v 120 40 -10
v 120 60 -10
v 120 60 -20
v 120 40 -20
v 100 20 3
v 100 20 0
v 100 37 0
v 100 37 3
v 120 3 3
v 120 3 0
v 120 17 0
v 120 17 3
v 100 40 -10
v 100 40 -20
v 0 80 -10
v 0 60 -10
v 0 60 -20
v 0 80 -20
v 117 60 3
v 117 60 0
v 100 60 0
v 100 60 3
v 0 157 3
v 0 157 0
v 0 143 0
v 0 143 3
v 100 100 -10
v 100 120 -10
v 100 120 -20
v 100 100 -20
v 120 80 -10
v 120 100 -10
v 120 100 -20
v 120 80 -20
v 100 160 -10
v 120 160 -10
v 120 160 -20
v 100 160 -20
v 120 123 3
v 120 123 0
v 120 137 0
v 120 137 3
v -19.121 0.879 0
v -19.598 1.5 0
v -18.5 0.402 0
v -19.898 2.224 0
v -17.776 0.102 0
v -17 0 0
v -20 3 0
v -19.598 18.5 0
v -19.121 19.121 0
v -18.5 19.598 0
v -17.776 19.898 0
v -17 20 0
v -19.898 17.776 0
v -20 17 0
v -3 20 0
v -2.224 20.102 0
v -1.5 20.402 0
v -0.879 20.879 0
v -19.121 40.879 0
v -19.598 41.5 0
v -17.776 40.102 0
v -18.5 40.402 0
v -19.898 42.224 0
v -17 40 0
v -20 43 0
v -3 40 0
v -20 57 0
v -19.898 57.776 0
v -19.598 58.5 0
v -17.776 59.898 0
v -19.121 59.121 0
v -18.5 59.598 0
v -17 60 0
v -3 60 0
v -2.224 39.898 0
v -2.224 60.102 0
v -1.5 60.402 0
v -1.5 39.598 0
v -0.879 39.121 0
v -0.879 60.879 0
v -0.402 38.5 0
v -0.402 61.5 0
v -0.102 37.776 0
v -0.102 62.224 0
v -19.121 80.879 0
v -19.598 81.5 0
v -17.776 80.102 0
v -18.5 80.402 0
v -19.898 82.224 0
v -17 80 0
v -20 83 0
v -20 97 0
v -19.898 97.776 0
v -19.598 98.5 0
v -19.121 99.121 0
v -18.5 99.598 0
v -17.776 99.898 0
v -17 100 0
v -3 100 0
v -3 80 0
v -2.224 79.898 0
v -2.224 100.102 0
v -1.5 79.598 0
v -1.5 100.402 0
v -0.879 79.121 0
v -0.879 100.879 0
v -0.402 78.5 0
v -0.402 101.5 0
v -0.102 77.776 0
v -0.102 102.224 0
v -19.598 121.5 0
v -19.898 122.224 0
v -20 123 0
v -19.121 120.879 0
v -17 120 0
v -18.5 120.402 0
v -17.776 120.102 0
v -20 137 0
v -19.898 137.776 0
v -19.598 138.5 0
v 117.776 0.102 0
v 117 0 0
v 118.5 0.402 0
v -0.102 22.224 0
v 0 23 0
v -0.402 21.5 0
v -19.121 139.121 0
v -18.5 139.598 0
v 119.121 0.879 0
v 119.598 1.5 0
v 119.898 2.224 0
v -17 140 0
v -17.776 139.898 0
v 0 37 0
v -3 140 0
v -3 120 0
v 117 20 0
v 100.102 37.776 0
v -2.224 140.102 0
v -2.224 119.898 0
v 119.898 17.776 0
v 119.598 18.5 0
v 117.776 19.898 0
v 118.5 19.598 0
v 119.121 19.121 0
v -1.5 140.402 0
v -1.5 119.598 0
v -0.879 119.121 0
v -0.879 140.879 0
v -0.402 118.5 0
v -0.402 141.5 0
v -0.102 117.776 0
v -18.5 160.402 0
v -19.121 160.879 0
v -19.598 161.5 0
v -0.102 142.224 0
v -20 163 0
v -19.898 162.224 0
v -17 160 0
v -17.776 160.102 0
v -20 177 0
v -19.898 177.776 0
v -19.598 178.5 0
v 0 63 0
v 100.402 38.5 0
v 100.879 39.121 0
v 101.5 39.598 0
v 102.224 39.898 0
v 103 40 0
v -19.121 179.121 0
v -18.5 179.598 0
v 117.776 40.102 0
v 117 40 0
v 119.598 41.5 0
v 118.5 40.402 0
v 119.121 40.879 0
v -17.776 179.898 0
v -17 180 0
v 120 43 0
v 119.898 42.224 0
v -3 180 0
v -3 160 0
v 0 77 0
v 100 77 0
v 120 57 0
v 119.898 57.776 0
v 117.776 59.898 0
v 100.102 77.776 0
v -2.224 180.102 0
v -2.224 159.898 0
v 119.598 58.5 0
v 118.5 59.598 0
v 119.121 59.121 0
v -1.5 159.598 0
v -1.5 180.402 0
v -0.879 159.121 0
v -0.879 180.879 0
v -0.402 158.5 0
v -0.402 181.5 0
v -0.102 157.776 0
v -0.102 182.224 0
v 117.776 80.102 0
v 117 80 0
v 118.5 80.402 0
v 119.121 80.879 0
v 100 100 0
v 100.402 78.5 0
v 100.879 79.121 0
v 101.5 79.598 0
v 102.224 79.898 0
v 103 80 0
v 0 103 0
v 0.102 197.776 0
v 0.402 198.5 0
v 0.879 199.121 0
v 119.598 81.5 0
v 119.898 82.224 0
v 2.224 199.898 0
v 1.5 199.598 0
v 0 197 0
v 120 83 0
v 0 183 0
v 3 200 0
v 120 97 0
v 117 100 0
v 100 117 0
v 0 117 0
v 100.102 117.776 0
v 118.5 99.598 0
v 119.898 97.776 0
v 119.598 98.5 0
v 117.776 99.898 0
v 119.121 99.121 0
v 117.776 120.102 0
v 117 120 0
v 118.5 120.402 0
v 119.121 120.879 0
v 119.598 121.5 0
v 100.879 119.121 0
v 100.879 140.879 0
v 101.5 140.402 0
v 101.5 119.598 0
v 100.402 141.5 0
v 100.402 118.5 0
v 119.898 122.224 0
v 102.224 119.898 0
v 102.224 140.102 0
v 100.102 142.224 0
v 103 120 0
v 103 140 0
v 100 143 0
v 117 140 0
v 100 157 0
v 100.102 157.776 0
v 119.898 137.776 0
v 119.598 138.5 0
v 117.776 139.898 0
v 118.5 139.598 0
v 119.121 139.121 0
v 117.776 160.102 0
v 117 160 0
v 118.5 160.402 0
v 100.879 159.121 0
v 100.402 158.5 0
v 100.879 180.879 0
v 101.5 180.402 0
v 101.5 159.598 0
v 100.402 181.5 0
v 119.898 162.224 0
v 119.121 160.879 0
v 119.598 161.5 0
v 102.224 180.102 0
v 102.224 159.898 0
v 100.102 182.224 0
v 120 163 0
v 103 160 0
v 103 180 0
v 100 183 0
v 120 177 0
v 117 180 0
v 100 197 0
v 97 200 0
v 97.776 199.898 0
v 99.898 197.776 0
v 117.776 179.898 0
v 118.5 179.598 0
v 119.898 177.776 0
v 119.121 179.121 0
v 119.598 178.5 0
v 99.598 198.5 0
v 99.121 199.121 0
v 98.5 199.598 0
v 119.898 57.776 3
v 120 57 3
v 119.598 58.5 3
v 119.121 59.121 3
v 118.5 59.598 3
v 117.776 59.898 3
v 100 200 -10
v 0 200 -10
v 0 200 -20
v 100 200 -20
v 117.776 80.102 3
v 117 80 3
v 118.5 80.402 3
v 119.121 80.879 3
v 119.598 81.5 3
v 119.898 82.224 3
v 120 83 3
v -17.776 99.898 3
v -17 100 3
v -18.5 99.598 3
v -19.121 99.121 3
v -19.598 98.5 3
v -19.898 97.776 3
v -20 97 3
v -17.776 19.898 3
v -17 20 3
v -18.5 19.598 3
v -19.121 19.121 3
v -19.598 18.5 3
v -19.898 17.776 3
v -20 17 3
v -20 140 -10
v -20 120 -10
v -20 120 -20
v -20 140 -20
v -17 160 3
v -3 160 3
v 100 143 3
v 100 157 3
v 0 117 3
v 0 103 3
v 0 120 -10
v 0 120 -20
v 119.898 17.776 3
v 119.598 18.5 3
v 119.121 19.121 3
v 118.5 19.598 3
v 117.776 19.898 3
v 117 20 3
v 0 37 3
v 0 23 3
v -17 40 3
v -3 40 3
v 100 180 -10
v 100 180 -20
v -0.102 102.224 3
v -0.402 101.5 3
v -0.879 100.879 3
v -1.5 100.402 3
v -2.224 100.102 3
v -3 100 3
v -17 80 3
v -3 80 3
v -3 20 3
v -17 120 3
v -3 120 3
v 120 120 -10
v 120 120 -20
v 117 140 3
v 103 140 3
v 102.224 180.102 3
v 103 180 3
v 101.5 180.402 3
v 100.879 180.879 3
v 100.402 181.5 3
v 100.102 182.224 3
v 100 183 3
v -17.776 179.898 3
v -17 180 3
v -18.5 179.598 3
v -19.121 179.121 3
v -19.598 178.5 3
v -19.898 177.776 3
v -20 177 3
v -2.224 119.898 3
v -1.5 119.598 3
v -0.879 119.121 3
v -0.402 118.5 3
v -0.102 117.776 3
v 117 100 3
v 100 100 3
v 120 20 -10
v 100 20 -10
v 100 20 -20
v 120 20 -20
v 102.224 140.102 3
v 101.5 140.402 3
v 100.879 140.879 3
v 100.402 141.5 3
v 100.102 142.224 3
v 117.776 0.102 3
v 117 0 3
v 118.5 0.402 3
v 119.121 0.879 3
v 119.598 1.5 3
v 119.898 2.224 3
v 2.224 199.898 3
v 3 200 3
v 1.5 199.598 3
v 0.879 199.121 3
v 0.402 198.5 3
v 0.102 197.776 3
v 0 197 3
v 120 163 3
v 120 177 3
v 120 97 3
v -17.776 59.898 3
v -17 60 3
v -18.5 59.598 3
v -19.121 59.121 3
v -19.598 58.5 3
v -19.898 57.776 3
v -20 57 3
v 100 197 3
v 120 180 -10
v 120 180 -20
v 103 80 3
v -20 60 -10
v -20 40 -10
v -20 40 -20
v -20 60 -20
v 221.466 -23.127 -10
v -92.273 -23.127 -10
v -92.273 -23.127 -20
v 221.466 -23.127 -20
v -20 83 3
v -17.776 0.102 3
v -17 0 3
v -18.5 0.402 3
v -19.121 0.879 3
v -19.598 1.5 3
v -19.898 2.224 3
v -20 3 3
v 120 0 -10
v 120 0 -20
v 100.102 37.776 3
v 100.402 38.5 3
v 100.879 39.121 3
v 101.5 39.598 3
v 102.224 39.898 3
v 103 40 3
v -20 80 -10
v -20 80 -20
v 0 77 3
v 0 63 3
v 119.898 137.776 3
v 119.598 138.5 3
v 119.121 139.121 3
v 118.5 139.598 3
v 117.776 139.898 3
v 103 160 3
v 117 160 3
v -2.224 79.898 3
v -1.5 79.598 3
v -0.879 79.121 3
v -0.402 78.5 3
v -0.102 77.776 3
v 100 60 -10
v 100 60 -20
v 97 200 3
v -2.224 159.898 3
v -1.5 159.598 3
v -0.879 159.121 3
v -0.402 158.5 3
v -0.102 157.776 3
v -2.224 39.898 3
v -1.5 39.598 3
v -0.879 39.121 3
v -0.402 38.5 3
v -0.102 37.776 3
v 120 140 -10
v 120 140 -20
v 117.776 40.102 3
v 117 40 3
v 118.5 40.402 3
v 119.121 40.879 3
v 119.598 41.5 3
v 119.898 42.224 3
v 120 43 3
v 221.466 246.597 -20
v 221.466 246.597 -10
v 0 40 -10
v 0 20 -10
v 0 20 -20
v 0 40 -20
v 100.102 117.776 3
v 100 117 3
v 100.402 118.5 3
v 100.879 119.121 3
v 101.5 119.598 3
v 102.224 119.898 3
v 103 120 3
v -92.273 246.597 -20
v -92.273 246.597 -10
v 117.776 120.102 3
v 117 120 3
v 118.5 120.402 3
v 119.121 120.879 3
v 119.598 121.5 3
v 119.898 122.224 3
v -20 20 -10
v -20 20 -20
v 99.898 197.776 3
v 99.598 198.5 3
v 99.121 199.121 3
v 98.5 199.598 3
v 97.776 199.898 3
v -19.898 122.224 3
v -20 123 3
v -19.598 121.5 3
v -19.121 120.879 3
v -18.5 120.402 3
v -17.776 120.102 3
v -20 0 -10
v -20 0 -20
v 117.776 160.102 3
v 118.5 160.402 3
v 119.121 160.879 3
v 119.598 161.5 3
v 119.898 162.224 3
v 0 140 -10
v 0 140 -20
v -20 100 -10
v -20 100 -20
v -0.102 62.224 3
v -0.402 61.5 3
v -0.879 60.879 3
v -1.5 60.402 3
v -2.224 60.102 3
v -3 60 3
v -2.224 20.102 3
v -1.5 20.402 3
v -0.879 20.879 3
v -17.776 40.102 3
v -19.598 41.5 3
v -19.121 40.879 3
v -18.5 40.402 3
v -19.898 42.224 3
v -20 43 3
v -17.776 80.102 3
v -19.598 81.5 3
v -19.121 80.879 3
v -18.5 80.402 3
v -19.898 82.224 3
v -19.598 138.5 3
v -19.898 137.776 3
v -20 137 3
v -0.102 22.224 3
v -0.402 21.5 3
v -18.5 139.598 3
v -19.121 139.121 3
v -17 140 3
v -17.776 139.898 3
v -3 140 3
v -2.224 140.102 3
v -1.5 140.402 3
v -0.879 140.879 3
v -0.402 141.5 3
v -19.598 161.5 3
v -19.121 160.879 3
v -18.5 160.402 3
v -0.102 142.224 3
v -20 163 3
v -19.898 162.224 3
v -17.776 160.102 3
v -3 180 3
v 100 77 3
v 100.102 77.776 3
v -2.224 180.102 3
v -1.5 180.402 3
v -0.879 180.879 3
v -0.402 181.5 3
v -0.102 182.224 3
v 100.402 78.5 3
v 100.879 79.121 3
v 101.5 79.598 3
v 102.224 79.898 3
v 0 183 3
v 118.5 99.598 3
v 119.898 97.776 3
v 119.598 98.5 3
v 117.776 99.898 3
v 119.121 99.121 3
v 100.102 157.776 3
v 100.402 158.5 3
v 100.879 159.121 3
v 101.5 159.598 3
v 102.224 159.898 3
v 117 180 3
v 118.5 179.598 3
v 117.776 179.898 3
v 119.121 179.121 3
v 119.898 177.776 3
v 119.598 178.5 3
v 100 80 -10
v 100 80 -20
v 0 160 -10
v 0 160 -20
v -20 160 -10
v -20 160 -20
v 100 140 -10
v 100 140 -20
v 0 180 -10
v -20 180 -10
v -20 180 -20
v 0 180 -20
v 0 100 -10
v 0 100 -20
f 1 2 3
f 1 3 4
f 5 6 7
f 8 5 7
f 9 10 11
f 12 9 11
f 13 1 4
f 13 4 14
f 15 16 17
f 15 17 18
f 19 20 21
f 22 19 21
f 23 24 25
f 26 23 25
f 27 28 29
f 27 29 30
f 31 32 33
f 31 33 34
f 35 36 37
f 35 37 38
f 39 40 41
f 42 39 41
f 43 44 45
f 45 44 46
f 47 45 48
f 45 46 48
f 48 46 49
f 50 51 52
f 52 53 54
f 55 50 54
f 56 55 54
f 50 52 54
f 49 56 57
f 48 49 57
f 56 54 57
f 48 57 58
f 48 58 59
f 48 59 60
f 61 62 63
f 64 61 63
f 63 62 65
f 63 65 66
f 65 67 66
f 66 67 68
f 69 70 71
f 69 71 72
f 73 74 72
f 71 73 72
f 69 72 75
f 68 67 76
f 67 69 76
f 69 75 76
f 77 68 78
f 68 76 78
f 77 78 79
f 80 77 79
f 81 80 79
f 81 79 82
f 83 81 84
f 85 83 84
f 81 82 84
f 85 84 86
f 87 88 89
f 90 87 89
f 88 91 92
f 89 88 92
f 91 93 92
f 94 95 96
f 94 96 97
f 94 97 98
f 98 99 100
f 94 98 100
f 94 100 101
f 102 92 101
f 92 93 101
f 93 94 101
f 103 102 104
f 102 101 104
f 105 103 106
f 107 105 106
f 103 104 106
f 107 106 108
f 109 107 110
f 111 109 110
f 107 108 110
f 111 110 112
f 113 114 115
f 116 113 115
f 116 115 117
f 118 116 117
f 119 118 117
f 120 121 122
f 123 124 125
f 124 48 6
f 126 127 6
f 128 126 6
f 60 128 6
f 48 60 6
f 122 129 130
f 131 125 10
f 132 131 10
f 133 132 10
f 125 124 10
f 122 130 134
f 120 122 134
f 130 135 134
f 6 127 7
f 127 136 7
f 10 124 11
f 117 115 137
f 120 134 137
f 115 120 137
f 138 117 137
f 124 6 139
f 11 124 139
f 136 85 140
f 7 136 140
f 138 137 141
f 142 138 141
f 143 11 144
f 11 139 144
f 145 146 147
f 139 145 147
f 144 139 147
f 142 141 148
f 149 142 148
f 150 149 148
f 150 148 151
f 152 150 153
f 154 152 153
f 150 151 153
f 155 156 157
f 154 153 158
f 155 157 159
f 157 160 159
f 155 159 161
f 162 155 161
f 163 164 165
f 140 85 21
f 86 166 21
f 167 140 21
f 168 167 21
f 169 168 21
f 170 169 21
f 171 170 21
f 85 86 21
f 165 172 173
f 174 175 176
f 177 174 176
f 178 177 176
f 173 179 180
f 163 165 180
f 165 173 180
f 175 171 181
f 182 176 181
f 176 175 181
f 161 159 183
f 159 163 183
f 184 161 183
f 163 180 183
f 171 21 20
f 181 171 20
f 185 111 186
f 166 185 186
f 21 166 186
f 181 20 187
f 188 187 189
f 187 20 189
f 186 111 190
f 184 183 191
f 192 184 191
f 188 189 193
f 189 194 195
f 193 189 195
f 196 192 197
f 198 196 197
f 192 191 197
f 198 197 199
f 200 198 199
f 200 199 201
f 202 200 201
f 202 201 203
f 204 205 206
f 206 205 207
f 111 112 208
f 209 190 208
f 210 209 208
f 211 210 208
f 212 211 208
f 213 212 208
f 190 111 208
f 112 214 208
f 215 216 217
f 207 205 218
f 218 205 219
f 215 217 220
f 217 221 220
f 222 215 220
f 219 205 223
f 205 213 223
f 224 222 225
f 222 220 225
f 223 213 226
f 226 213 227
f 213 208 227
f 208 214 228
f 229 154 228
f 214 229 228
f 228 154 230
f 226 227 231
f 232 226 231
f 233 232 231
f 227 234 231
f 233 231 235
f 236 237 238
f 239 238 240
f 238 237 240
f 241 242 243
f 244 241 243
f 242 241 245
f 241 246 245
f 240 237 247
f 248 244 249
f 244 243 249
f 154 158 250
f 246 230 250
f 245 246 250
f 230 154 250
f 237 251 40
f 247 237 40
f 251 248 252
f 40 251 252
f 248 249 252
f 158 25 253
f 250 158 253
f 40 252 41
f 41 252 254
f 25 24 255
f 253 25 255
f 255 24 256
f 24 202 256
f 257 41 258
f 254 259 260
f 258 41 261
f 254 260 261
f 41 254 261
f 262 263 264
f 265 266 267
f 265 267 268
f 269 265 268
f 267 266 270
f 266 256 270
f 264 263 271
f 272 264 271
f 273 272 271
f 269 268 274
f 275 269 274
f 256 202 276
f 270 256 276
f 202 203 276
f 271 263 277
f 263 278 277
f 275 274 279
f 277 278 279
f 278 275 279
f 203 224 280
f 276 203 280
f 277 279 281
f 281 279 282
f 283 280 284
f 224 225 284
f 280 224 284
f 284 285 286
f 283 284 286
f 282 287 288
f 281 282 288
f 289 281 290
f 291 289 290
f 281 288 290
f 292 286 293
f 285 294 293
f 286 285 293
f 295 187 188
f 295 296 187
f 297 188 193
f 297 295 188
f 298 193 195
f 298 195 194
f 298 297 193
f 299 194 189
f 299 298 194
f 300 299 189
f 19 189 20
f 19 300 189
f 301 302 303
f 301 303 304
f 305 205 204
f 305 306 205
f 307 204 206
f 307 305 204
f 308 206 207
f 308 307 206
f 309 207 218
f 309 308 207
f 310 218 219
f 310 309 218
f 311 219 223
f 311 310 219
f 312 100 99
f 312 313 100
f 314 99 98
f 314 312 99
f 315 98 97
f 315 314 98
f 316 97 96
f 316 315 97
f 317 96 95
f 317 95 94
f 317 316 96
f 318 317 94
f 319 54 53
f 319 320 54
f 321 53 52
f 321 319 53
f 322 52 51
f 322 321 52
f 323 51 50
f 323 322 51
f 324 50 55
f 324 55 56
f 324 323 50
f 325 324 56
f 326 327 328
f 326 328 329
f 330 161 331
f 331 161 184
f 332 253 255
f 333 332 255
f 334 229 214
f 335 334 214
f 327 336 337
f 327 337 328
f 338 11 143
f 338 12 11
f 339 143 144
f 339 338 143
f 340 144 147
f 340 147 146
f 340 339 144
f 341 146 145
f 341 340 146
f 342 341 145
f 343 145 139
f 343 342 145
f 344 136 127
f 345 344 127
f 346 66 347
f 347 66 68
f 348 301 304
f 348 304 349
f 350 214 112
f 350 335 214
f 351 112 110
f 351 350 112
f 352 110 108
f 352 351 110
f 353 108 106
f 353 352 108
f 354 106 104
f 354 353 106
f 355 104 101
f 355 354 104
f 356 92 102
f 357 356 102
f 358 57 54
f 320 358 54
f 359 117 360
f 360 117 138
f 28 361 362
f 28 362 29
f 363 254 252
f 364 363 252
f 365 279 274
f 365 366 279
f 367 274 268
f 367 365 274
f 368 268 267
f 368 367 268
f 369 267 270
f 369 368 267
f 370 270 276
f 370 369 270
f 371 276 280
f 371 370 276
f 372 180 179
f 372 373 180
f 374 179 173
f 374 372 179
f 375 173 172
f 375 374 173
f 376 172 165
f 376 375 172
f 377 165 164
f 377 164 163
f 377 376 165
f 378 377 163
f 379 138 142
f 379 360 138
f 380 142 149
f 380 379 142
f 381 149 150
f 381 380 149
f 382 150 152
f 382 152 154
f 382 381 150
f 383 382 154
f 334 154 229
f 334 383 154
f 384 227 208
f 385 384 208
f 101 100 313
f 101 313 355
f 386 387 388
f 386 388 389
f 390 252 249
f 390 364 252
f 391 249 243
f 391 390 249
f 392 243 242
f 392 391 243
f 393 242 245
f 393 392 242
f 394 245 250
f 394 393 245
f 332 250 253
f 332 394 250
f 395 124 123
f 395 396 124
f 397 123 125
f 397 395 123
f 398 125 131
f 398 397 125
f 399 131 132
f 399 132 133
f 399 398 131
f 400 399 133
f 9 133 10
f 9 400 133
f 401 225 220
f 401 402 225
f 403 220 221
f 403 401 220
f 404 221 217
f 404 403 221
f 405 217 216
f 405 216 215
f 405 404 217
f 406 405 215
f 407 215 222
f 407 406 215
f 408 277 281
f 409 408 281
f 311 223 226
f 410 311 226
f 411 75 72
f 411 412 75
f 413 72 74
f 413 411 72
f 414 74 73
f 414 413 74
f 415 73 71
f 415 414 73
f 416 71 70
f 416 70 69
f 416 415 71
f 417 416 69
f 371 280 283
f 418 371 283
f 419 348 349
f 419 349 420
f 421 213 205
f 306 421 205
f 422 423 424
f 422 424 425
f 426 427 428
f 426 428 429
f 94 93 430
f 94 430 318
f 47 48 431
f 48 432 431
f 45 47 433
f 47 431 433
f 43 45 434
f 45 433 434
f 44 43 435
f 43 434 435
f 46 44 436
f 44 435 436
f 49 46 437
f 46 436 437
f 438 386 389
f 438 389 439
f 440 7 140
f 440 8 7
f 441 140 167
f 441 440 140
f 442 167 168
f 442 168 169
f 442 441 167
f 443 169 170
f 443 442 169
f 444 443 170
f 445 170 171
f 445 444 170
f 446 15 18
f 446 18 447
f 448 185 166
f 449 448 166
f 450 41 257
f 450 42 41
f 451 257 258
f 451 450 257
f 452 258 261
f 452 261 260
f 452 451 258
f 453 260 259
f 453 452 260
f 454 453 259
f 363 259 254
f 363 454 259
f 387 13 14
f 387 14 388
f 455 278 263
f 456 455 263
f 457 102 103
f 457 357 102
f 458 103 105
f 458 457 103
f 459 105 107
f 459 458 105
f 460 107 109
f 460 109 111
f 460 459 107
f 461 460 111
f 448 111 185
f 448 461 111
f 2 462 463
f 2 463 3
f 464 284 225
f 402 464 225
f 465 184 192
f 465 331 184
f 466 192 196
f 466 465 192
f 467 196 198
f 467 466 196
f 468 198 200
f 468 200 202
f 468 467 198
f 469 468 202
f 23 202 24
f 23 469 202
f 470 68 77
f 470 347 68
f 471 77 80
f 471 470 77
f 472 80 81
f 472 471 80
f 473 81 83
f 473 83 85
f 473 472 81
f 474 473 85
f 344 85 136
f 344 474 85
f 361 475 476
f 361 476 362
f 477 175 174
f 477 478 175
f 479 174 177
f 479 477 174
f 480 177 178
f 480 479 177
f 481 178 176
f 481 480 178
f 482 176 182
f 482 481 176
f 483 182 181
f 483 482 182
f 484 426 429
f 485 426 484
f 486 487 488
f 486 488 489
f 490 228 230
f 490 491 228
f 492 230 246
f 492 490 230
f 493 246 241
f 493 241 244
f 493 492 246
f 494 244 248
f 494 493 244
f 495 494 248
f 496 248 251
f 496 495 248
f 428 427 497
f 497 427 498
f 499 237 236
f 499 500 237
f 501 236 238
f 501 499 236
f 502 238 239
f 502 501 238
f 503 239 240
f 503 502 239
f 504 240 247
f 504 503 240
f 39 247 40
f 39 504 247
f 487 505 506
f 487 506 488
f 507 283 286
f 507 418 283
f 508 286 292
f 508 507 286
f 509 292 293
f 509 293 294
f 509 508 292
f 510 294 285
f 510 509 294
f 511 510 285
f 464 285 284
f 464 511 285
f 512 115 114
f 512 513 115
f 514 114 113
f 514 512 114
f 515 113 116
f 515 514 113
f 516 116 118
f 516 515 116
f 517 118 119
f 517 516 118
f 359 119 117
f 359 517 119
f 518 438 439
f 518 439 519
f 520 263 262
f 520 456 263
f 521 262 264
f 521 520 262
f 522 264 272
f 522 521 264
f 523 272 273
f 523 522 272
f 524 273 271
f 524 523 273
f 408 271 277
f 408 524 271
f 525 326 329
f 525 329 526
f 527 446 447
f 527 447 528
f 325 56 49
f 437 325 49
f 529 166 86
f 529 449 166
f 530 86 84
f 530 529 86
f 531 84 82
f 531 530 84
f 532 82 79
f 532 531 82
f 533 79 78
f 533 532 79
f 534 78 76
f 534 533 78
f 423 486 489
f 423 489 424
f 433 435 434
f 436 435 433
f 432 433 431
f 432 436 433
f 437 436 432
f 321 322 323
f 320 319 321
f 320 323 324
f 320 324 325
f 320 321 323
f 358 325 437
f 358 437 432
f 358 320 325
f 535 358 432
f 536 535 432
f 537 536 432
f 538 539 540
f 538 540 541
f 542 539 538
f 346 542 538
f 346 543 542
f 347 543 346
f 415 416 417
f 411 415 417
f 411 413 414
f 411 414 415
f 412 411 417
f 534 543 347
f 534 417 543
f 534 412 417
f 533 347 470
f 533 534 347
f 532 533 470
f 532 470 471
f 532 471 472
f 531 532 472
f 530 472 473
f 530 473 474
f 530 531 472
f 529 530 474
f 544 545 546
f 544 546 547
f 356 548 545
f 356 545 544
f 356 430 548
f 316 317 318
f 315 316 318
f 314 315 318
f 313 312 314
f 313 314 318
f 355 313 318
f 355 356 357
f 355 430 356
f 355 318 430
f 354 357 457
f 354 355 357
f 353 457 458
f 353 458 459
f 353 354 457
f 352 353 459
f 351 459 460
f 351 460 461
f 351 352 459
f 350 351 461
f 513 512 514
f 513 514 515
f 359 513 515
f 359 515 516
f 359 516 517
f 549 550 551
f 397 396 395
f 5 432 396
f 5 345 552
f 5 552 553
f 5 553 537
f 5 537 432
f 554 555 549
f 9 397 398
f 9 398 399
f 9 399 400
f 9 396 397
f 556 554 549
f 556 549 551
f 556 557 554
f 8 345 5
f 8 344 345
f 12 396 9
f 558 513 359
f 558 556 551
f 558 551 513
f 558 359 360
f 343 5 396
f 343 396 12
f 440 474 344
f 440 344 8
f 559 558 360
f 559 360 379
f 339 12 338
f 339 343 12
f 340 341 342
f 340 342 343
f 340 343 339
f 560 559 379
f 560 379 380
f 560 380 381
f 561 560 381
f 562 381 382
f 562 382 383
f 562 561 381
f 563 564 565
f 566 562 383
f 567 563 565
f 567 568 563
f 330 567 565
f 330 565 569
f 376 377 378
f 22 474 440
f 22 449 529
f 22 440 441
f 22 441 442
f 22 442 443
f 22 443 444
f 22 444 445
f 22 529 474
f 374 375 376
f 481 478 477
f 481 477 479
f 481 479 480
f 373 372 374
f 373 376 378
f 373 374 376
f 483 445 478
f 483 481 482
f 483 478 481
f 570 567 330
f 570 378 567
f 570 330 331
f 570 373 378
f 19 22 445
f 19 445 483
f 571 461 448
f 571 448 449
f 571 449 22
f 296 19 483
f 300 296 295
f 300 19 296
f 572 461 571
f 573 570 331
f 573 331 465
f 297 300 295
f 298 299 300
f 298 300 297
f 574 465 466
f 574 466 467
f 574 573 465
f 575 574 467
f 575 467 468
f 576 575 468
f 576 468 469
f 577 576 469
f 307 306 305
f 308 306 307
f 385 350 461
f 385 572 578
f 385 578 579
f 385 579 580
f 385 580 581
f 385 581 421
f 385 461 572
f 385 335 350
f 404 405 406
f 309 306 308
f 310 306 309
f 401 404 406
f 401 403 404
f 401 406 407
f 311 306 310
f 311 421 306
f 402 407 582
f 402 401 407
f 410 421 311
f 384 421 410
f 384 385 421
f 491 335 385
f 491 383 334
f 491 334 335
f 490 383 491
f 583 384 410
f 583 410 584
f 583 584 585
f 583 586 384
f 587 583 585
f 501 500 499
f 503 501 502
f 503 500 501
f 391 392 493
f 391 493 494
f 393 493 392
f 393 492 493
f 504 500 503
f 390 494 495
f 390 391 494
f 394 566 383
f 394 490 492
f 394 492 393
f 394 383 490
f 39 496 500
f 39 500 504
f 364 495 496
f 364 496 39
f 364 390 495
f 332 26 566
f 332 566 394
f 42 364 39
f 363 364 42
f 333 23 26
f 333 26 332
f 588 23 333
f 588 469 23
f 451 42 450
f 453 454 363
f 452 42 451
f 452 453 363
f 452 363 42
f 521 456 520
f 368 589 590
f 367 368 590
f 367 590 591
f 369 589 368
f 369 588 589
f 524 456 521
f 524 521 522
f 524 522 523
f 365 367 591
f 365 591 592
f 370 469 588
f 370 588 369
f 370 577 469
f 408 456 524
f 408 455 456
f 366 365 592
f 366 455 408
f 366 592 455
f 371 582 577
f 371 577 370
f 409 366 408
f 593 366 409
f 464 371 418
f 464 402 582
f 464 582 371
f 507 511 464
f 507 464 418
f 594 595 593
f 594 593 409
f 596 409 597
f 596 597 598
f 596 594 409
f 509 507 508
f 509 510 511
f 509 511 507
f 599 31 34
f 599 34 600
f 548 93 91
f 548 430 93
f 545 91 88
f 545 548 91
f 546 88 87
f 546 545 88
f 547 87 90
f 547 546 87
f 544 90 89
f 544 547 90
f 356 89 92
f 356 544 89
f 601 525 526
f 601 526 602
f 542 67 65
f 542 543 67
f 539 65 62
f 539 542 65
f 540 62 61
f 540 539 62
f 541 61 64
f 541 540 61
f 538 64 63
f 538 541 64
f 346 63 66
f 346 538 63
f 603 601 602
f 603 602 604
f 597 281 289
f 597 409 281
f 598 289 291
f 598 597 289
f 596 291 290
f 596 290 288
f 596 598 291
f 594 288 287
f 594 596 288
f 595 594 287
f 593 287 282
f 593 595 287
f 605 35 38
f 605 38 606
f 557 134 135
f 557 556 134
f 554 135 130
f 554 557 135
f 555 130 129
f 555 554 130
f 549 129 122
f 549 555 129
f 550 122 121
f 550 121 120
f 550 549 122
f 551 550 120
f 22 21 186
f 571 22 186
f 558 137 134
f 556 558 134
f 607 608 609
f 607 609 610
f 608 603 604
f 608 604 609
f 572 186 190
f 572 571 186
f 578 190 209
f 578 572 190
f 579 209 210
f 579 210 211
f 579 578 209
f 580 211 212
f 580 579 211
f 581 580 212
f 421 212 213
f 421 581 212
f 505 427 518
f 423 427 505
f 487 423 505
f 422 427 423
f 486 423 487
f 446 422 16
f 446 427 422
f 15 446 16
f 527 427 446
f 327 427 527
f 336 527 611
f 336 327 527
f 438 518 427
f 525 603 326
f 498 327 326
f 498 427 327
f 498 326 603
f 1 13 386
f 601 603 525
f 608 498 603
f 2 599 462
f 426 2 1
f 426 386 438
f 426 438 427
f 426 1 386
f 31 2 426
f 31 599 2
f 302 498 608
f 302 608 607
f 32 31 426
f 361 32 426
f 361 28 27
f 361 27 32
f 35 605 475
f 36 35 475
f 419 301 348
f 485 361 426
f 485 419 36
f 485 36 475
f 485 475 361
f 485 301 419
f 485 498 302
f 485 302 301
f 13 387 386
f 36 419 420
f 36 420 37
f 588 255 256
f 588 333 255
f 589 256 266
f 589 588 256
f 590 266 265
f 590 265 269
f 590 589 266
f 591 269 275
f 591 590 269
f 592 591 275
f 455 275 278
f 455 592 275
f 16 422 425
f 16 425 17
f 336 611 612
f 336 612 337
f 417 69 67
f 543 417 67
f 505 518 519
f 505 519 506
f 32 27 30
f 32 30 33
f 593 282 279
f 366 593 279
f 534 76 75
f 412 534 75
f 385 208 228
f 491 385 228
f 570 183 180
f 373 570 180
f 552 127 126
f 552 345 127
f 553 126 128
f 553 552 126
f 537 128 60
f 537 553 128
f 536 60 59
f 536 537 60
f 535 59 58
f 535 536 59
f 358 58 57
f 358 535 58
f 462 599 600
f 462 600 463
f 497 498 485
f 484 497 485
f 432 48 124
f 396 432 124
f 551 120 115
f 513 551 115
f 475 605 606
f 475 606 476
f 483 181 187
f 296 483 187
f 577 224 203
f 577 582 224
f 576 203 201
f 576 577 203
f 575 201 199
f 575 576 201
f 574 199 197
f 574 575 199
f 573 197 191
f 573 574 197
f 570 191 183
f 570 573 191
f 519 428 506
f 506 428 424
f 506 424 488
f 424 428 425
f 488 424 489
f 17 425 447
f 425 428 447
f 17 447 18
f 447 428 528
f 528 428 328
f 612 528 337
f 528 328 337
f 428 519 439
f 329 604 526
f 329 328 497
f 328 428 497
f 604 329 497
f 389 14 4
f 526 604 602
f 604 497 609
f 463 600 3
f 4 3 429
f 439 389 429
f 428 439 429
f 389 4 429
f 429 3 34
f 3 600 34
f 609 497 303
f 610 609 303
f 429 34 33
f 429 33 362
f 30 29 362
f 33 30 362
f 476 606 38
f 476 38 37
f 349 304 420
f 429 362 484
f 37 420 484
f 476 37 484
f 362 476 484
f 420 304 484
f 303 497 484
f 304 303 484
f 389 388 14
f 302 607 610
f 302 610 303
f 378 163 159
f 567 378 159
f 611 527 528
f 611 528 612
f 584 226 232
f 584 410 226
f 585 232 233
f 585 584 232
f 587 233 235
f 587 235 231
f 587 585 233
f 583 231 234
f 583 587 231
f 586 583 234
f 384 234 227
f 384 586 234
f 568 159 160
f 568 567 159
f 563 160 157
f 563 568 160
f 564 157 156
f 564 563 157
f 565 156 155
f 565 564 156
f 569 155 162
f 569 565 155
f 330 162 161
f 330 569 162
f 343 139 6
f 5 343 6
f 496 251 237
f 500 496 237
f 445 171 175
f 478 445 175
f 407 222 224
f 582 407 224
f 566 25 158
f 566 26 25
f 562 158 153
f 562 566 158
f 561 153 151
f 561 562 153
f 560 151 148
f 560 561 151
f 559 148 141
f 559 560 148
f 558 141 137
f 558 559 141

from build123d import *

# Parameters (mm, degrees)
F0_W     = 20
F0_H     = 20
F1_DEPTH = 3
F2_R     = 3
F3_START = -10
F0_W_2   = 313.7396425009
F0_H_2   = 269.723970443
F3_DEPTH = 10


with BuildPart() as f1:
    # F0 (on Top) → F1 (new body)
    with BuildSketch(Plane.XY):
        Polygon((-20, 0), (0, 0), (100, 0), (120, 0), (120, 20), (100, 20), (100, 40), (120, 40), (120, 60), (100, 60), (100, 80), (120, 80), (120, 100), (100, 100), (100, 120), (120, 120), (120, 140), (100, 140), (100, 160), (120, 160), (120, 180), (100, 180), (100, 200), (0, 200), (0, 180), (-20, 180), (-20, 160), (0, 160), (0, 140), (-20, 140), (-20, 120), (0, 120), (0, 100), (0, 80), (0, 60), (-20, 60), (-20, 40), (0, 40), (0, 20), (-20, 20), align=None)
        with Locations((-10, 90)):
            Rectangle(F0_W, F0_H)
    extrude(amount=F1_DEPTH)

    # F2
    f2_edges = [f1.edges().sort_by_distance(p)[0] for p in [
        (120, 160, 1.5),
        (100, 160, 1.5),
        (100, 120, 1.5),
        (100, 80, 1.5),
        (120, 80, 1.5),
        (120, 40, 1.5),
        (100, 40, 1.5),
        (120, 0, 1.5),
        (120, 20, 1.5),
        (120, 60, 1.5),
        (120, 100, 1.5),
        (120, 120, 1.5),
        (120, 140, 1.5),
        (120, 180, 1.5),
        (100, 200, 1.5),
        (-20, 40, 1.5),
        (-20, 0, 1.5),
        (-20, 80, 1.5),
        (-20, 120, 1.5),
        (-20, 160, 1.5),
        (-20, 180, 1.5),
        (0, 180, 1.5),
        (0, 140, 1.5),
        (0, 100, 1.5),
        (0, 60, 1.5),
        (0, 20, 1.5),
        (0, 120, 1.5),
        (0, 160, 1.5),
        (0, 40, 1.5),
        (0, 200, 1.5),
        (-20, 20, 1.5),
        (-20, 140, 1.5),
        (-20, 100, 1.5),
        (-20, 60, 1.5),
        (100, 140, 1.5),
        (0, 80, 1.5),
        (100, 180, 1.5),
    ]]
    fillet(f2_edges, radius=F2_R)


with BuildPart() as f3:
    # F0 (on Top) → F3 (new body)
    with BuildSketch(Plane.XY.offset(F3_START)):
        with Locations((64.596362412, 111.7345299572)):
            Rectangle(F0_W_2, F0_H_2)
        Polygon((100, 0), (0, 0), (-20, 0), (-20, 20), (0, 20), (0, 40), (-20, 40), (-20, 60), (0, 60), (0, 80), (-20, 80), (-20, 100), (0, 100), (0, 120), (-20, 120), (-20, 140), (0, 140), (0, 160), (-20, 160), (-20, 180), (0, 180), (0, 200), (100, 200), (100, 180), (120, 180), (120, 160), (100, 160), (100, 140), (120, 140), (120, 120), (100, 120), (100, 100), (120, 100), (120, 80), (100, 80), (100, 60), (120, 60), (120, 40), (100, 40), (100, 20), (120, 20), (120, 0), align=None, mode=Mode.SUBTRACT)
    extrude(amount=-F3_DEPTH)


solid = Compound([f1.part, f3.part])
